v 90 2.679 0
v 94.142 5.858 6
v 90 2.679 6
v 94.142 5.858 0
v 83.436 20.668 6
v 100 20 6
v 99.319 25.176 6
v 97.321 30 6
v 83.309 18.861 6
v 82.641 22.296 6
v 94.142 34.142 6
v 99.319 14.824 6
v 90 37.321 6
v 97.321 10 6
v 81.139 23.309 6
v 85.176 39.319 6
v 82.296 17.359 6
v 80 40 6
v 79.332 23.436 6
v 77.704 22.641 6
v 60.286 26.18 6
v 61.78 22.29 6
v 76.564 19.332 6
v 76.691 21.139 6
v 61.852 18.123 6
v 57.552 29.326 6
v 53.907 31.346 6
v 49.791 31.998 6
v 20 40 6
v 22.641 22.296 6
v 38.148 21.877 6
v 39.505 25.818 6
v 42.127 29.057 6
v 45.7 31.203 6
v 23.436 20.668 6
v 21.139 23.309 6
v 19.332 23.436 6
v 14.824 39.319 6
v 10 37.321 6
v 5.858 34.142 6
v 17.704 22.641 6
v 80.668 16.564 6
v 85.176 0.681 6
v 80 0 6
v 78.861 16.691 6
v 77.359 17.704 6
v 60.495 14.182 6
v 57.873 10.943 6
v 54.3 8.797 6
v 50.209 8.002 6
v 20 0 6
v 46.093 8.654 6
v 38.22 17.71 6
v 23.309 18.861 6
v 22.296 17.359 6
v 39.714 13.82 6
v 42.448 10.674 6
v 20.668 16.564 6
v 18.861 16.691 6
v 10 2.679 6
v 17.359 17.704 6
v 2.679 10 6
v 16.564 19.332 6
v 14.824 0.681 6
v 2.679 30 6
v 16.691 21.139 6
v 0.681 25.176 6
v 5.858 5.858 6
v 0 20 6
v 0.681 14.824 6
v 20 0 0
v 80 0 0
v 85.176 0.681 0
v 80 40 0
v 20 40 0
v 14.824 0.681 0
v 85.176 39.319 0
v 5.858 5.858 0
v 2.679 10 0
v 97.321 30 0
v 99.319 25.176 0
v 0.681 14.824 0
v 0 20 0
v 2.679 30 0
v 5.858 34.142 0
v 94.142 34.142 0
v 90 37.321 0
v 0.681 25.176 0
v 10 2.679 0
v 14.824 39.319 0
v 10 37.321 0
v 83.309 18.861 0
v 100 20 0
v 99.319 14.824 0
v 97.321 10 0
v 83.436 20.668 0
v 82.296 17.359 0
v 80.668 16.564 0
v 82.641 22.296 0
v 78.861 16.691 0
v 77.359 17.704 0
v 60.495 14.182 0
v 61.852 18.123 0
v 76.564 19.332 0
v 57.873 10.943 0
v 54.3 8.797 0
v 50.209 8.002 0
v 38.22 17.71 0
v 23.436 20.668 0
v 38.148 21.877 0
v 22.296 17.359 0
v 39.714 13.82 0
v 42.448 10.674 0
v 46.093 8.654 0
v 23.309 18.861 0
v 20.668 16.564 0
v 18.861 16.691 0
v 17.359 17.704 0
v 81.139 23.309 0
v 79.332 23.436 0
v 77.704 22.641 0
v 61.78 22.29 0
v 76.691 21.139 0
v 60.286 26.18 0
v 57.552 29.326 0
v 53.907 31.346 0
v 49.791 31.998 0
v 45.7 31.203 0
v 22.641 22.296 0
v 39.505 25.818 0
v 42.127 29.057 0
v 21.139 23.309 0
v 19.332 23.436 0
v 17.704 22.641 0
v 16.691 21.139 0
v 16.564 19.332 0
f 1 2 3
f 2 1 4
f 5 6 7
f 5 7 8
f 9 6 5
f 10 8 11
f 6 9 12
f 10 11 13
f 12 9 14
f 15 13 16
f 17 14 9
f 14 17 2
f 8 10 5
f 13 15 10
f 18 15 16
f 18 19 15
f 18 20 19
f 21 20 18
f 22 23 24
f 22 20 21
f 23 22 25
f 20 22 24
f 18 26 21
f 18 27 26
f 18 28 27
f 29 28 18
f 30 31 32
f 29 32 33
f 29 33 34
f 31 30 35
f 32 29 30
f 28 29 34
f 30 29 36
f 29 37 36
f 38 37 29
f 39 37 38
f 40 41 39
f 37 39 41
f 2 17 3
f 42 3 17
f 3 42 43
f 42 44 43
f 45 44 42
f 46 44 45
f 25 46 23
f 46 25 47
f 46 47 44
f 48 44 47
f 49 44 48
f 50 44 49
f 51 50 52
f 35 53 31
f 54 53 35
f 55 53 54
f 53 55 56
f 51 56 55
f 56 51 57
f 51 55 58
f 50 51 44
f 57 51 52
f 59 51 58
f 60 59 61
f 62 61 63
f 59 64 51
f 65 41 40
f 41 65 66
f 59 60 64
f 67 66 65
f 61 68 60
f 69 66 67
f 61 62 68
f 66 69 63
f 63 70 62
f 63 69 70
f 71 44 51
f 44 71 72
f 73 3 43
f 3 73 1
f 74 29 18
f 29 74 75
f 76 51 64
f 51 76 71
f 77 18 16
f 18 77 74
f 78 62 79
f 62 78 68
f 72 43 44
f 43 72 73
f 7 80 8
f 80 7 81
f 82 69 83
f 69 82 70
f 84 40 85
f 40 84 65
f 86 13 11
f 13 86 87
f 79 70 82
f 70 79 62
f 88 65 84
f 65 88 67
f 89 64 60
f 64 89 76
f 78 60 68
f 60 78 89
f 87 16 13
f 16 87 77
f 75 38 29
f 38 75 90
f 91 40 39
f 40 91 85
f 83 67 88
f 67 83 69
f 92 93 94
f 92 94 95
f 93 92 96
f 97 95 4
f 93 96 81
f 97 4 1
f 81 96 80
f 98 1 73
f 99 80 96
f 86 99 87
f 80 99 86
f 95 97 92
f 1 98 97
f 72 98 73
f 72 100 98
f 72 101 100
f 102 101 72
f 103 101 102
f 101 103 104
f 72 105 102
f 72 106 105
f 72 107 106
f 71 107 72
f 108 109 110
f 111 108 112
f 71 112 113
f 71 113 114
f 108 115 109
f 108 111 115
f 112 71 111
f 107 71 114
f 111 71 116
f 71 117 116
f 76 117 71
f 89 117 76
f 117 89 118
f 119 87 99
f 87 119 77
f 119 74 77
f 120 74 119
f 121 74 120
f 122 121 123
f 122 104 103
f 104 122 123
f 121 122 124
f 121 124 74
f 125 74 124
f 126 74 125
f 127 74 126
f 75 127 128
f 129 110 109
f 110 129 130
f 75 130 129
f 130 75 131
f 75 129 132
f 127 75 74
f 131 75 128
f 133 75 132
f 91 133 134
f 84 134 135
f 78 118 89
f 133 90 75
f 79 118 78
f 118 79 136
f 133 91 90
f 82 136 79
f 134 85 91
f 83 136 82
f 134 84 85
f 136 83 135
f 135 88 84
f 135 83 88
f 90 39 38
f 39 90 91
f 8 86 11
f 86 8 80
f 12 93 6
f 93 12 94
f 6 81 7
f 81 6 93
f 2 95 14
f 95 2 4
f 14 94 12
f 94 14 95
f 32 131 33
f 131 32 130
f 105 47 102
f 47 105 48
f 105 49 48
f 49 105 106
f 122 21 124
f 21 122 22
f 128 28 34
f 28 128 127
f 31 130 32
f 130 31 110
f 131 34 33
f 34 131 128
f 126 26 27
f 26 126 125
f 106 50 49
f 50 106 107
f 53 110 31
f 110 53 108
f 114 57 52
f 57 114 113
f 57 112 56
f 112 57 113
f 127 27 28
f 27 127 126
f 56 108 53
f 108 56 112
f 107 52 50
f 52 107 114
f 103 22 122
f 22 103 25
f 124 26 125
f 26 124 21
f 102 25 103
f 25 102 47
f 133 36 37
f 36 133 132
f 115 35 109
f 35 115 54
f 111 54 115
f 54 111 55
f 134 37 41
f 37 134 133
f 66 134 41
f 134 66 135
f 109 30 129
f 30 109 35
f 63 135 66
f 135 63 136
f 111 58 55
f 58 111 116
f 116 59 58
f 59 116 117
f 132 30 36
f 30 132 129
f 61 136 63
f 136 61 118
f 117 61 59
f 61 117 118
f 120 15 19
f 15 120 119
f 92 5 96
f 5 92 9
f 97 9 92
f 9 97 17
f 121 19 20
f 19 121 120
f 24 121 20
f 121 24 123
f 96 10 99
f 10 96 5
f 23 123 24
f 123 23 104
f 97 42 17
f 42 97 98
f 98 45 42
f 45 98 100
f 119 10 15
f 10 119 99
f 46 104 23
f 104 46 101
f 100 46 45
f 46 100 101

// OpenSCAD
$fn = 32;

// ----------------------------------------------------------------------
// Spacer plate: obround span 60, caps R20
// ----------------------------------------------------------------------

// --- parameters (mm) ---
bore_r = 12;              // centre bore radius
bolt_r = 3.5;             // bolt hole radius
plate_t = 6;              // plate thickness, Z (extrusion height)
span = 60;                // obround span
cap_r = 20;               // cap radius

profile = [[20, 40], [14.824, 39.319], [10, 37.321], [5.858, 34.142], [2.679, 30], [0.681, 25.176], [0, 20], [0.681, 14.824], [2.679, 10], [5.858, 5.858], [10, 2.679], [14.824, 0.681], [20, 0], [80, 0], [85.176, 0.681], [90, 2.679], [94.142, 5.858], [97.321, 10], [99.319, 14.824], [100, 20], [99.319, 25.176], [97.321, 30], [94.142, 34.142], [90, 37.321], [85.176, 39.319], [80, 40]];  // primary outline, 26 points, counter clockwise
void_1 = [[61.78, 22.29], [60.286, 26.18], [57.552, 29.326], [53.907, 31.346], [49.791, 31.998], [45.7, 31.203], [42.127, 29.057], [39.505, 25.818], [38.148, 21.877], [38.22, 17.71], [39.714, 13.82], [42.448, 10.674], [46.093, 8.654], [50.209, 8.002], [54.3, 8.797], [57.873, 10.943], [60.495, 14.182], [61.852, 18.123]];  // centre bore, 18 points
void_2 = [[23.436, 20.668], [22.641, 22.296], [21.139, 23.309], [19.332, 23.436], [17.704, 22.641], [16.691, 21.139], [16.564, 19.332], [17.359, 17.704], [18.861, 16.691], [20.668, 16.564], [22.296, 17.359], [23.309, 18.861]];  // end hole, 12 points
void_3 = [[83.436, 20.668], [82.641, 22.296], [81.139, 23.309], [79.332, 23.436], [77.704, 22.641], [76.691, 21.139], [76.564, 19.332], [77.359, 17.704], [78.861, 16.691], [80.668, 16.564], [82.296, 17.359], [83.309, 18.861]];  // end hole, 12 points

// --- the one profile operation ---
difference() {
  linear_extrude(height = plate_t) polygon(points = profile);
  translate([0, 0, -1])
    linear_extrude(height = plate_t + 2) polygon(points = void_1);
  translate([0, 0, -1])
    linear_extrude(height = plate_t + 2) polygon(points = void_2);
  translate([0, 0, -1])
    linear_extrude(height = plate_t + 2) polygon(points = void_3);
}
